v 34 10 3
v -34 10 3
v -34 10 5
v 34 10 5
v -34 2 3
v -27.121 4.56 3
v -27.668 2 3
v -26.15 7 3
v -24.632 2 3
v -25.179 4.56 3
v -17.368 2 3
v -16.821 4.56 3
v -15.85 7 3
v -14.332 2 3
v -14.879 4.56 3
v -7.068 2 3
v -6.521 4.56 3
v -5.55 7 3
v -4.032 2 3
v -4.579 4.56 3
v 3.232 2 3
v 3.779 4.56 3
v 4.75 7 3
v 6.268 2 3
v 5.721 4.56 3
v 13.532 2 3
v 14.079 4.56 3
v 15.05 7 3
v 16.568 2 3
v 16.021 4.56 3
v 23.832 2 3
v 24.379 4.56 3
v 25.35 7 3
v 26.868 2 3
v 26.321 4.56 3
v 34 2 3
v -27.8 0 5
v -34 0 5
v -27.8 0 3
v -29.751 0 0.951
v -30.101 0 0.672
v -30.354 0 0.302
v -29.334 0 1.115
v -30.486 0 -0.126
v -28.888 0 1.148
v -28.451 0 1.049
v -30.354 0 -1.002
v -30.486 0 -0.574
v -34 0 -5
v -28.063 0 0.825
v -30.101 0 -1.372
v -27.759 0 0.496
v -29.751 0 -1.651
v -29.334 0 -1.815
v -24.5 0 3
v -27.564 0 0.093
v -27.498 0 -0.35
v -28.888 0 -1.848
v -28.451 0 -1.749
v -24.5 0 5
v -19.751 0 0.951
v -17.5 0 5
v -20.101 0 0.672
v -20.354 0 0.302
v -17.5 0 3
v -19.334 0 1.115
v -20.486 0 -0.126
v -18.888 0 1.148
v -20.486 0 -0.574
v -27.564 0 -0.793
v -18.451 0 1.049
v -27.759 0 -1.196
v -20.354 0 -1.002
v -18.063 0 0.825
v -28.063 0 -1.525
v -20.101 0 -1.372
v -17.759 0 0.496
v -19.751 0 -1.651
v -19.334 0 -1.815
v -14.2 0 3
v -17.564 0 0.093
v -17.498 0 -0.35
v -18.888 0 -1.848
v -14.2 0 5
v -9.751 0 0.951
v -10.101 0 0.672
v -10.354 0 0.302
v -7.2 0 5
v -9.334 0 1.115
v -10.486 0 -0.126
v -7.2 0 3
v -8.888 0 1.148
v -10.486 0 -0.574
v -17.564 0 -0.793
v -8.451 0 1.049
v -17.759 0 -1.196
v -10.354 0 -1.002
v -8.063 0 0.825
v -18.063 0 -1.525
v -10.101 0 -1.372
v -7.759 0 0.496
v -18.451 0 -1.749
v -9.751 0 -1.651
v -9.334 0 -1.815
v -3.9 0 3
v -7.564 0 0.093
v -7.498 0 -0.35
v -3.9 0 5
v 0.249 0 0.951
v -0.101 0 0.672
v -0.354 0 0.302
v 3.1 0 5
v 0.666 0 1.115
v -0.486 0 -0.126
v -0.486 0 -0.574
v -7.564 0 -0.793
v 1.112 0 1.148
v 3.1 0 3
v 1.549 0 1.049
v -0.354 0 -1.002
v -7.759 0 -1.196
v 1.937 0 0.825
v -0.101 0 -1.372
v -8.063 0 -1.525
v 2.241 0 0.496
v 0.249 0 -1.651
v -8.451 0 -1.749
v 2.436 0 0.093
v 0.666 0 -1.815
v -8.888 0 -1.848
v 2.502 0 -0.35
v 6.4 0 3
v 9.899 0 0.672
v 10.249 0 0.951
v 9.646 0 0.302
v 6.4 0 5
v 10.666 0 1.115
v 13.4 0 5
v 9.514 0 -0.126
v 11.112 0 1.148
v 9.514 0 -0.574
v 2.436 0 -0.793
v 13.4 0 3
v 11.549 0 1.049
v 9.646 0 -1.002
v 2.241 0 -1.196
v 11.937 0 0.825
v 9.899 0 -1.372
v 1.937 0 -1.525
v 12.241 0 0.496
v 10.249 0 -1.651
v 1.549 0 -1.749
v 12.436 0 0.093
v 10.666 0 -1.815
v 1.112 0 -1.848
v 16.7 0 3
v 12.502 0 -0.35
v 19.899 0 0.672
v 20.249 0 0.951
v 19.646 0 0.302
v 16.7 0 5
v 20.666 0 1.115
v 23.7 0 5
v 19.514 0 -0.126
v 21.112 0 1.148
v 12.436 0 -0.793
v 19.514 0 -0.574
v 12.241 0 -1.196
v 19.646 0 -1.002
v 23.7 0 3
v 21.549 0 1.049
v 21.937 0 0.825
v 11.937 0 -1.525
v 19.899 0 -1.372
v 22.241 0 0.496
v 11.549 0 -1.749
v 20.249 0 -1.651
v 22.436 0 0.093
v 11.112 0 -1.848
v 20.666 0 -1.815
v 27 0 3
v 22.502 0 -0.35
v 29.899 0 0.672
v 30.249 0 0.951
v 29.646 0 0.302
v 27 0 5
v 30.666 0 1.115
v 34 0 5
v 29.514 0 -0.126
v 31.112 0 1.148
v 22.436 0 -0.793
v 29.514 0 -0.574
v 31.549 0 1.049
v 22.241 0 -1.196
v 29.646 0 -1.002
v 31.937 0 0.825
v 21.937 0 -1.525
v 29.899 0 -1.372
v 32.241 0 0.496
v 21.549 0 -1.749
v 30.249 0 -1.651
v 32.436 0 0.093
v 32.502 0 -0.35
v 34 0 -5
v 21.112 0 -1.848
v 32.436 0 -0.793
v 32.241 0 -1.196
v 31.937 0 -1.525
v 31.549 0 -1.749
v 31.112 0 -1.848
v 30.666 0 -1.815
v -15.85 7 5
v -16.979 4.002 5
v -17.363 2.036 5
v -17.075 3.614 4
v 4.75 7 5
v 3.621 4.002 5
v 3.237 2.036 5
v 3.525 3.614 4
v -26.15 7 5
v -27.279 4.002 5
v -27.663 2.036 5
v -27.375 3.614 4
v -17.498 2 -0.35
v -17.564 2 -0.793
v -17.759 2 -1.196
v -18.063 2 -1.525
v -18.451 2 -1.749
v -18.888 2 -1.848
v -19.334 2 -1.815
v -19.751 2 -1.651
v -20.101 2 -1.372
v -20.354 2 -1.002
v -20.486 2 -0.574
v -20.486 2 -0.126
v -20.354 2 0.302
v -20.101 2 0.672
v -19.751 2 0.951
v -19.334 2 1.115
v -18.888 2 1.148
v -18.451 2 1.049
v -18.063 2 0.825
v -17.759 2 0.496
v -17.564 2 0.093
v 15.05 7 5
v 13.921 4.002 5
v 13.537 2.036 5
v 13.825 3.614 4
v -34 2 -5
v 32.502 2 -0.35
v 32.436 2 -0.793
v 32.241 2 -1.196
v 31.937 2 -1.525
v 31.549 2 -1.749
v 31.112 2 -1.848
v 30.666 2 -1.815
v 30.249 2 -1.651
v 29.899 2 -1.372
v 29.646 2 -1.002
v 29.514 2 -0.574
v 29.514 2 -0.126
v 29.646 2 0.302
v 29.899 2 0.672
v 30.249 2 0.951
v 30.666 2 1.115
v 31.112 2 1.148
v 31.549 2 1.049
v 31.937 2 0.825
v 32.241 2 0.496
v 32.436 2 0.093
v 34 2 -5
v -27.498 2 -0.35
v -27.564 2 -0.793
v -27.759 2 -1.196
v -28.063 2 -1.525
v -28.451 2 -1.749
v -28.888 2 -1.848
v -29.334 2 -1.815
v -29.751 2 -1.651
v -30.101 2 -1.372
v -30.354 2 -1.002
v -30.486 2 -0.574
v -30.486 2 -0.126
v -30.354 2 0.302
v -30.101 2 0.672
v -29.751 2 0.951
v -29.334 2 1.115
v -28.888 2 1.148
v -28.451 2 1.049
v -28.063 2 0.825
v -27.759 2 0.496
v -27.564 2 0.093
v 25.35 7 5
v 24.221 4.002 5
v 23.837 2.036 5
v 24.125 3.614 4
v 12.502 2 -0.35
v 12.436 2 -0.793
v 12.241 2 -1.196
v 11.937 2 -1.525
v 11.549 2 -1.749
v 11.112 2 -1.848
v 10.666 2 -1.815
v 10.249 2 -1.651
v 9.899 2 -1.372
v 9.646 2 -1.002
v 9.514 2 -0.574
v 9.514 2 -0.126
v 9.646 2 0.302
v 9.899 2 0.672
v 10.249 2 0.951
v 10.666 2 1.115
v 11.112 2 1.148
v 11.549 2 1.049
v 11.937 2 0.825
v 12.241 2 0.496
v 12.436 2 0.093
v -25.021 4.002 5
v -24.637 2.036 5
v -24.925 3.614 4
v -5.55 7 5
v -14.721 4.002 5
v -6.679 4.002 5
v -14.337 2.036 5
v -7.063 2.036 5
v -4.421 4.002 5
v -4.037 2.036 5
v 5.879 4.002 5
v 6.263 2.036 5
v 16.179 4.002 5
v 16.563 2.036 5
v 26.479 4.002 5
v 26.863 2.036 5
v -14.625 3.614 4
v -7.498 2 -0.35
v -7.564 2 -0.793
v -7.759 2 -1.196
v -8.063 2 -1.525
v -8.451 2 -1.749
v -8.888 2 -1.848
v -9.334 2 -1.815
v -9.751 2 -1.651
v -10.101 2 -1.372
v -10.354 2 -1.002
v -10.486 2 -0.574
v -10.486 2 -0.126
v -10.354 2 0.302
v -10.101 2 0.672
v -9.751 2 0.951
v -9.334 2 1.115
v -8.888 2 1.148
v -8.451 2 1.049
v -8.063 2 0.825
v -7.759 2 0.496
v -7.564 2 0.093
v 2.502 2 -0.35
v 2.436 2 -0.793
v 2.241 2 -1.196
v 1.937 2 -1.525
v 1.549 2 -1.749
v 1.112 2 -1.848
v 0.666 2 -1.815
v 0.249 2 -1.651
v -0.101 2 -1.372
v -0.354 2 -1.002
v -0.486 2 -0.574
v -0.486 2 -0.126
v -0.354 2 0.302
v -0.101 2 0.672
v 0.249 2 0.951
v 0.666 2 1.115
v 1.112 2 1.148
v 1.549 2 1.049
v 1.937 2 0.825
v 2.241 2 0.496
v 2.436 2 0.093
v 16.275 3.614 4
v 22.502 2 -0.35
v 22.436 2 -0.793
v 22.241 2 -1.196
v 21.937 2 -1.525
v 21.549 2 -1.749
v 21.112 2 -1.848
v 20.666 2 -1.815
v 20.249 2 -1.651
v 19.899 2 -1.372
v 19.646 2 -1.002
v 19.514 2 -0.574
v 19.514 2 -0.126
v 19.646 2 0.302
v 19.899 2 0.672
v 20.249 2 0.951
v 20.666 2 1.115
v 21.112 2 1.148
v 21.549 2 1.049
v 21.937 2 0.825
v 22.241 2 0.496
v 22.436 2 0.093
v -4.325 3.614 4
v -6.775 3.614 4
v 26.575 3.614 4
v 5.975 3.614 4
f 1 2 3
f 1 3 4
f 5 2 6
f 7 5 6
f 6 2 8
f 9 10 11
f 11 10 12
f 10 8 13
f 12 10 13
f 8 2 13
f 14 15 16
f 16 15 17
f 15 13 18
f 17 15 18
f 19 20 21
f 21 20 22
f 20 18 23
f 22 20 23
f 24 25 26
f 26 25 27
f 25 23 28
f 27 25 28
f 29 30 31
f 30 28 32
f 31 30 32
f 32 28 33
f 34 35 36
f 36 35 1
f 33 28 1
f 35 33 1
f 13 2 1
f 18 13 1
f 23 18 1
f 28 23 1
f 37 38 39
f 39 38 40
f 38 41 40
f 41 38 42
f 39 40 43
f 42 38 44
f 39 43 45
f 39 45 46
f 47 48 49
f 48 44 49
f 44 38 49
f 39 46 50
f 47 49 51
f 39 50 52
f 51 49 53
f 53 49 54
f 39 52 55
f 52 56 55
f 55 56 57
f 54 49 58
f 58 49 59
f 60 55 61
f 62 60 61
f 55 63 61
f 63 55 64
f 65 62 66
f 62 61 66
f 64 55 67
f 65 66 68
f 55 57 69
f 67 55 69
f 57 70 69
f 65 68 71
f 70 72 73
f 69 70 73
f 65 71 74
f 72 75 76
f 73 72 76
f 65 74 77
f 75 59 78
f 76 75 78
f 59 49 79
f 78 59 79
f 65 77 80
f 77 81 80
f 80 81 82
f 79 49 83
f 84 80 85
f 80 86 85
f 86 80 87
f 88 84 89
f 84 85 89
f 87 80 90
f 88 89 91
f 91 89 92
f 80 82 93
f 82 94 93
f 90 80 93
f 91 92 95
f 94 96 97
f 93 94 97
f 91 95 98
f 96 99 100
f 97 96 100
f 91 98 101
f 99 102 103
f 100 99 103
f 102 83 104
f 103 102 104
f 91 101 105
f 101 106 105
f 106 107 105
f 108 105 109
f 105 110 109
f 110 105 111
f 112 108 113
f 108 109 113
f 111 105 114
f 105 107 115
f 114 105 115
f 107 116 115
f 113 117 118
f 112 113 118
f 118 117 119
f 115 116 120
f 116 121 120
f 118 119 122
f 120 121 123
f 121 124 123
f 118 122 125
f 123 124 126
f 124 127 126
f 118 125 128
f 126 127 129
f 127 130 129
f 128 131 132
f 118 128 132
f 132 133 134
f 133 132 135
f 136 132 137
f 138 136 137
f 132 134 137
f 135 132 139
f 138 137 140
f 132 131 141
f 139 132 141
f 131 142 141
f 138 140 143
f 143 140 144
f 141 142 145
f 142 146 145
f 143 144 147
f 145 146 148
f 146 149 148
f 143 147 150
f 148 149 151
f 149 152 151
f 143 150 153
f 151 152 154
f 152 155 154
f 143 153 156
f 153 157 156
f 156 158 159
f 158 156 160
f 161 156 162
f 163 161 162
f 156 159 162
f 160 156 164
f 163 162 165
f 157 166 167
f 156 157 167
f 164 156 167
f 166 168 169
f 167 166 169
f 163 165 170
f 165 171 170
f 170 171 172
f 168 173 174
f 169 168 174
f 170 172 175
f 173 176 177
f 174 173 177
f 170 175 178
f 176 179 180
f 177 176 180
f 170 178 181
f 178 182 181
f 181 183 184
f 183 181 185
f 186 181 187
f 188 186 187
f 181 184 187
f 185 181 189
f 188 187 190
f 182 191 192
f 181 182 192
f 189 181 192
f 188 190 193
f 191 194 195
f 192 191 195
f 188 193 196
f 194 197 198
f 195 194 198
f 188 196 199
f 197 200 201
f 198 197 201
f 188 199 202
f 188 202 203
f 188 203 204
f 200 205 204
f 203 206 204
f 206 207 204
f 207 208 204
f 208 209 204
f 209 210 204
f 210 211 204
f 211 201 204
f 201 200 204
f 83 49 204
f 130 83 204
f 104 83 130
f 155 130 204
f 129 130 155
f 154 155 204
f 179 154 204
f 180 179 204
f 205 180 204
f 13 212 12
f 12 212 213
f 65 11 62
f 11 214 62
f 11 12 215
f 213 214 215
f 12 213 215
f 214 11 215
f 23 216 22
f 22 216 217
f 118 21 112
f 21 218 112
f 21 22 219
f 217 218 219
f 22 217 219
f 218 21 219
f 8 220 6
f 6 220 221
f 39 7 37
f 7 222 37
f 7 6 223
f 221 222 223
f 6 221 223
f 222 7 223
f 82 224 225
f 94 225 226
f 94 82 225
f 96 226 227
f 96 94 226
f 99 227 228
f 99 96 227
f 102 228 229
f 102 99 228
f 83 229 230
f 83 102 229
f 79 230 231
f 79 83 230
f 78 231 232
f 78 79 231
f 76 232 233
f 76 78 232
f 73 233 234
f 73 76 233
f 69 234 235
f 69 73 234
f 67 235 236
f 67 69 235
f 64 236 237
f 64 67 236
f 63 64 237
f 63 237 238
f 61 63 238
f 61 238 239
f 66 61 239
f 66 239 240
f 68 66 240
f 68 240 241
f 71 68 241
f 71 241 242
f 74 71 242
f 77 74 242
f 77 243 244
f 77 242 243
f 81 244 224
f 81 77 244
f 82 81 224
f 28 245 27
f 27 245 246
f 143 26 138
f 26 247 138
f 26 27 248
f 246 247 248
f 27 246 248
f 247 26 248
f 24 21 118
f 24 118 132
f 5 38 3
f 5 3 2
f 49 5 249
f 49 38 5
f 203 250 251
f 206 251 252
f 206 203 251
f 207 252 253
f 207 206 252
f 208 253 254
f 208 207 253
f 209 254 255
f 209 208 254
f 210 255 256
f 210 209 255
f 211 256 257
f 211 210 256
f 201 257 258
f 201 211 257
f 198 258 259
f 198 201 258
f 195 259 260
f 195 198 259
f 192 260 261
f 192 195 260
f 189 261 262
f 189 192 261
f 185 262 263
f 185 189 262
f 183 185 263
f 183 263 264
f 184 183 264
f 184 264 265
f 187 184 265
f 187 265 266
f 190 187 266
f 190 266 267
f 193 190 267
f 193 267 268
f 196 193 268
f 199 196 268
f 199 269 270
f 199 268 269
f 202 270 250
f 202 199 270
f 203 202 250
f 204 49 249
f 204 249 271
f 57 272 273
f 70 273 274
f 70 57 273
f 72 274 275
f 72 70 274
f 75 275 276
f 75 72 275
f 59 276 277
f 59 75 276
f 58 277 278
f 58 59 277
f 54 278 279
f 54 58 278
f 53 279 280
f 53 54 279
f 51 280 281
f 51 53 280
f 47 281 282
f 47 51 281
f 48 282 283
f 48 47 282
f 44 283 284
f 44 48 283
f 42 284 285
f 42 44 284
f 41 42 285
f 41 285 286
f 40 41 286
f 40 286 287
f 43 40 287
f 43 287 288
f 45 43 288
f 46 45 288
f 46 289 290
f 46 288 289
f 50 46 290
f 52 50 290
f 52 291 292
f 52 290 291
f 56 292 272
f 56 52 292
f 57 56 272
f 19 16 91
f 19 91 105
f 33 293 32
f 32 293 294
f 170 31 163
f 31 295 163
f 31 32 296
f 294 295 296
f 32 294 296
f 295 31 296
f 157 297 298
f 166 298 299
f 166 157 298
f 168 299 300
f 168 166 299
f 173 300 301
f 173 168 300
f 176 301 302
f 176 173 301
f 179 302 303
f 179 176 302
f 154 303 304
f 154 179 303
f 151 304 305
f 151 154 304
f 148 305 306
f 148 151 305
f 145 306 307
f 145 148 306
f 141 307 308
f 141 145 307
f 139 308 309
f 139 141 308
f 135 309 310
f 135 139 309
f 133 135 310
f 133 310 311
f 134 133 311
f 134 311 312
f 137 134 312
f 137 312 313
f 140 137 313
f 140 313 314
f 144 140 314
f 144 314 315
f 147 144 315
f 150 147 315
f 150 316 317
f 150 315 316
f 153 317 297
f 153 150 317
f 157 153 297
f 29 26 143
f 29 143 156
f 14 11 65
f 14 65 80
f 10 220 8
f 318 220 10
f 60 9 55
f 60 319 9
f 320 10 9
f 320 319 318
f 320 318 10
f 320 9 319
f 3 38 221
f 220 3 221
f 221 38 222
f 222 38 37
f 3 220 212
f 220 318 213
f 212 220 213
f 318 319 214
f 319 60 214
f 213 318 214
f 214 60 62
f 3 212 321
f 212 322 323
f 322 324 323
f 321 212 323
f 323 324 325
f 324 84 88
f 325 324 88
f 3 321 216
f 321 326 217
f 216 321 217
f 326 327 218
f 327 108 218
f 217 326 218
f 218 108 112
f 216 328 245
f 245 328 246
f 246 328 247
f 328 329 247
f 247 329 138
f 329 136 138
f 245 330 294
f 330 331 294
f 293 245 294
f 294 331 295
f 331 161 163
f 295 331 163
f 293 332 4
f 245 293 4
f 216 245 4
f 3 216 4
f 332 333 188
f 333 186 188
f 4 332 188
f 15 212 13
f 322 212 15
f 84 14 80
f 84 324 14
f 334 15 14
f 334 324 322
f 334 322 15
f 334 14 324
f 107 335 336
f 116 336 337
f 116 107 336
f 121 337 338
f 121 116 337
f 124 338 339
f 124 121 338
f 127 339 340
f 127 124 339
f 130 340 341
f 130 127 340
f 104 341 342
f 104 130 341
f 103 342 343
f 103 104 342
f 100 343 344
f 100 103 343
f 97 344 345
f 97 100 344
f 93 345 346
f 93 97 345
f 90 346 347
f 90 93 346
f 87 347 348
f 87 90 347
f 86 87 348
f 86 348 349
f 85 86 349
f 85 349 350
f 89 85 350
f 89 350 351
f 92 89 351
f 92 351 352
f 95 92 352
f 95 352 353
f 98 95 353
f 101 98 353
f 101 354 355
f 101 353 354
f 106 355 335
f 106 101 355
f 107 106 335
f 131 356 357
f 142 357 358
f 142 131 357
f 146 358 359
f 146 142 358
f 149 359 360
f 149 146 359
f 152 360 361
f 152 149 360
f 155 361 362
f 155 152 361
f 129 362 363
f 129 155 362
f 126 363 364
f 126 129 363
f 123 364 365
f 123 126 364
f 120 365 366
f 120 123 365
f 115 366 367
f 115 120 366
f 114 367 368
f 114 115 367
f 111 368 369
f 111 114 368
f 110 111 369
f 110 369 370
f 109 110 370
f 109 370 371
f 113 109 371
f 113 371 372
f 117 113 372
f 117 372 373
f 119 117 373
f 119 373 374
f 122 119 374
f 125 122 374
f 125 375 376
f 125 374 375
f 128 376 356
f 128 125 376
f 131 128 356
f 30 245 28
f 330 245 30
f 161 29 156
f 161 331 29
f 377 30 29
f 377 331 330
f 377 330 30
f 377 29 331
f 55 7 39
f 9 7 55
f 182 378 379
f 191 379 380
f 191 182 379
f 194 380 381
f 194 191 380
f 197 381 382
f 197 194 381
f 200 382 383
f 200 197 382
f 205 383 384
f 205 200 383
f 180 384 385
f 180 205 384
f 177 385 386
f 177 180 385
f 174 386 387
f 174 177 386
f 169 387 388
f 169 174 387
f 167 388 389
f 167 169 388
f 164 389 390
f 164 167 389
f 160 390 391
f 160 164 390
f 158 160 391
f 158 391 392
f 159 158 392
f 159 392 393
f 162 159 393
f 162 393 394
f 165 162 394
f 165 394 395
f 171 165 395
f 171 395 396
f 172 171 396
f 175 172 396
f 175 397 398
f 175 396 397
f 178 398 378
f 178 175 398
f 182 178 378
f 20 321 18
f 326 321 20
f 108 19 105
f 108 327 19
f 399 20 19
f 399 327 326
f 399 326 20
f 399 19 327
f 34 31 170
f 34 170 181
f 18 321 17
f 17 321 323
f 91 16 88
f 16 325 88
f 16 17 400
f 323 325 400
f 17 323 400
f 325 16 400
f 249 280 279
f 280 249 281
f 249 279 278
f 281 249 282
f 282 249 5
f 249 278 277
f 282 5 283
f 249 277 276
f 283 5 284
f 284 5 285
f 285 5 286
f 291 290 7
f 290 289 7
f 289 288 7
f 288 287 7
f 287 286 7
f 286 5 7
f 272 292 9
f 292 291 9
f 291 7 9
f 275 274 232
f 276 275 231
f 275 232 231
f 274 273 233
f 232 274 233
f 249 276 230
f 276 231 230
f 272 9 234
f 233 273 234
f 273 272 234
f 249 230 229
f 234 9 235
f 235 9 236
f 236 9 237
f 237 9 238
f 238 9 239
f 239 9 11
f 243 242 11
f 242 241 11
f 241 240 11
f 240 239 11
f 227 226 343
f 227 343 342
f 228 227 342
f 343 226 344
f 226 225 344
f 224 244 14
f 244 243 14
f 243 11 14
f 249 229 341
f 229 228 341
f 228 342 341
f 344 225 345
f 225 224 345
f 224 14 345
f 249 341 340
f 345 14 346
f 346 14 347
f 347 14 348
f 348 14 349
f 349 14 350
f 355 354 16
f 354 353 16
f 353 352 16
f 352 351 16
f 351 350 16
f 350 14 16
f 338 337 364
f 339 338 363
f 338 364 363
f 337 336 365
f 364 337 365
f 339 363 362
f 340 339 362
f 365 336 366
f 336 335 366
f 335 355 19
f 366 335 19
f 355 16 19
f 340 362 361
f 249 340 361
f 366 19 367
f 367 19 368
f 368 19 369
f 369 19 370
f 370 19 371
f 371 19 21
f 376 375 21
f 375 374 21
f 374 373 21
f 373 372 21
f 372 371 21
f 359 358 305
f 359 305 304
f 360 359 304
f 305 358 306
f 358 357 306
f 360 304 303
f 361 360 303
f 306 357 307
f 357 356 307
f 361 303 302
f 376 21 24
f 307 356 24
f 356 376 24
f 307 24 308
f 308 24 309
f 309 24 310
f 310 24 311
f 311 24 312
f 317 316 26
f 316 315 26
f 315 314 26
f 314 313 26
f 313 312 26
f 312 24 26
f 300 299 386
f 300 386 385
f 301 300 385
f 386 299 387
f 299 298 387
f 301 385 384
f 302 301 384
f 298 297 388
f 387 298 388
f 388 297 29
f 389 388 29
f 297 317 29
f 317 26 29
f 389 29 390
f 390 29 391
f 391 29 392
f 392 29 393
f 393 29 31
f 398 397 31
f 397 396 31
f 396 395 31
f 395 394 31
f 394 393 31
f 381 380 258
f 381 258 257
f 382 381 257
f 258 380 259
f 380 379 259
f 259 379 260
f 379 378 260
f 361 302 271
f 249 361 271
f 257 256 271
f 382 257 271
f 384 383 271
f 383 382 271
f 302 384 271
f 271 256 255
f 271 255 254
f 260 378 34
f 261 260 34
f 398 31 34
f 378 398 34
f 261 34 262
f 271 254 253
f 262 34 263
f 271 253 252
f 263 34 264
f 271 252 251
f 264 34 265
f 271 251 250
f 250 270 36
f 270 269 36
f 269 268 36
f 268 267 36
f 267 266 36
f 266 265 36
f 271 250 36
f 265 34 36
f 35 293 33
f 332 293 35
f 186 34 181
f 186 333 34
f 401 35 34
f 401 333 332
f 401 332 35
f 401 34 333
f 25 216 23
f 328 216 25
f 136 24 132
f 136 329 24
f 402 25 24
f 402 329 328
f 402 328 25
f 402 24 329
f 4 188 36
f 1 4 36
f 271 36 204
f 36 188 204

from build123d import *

# Parameters (mm, degrees)
SKETCH1_W                      = 68
SKETCH1_H                      = 10
SKETCH1_R                      = 1.5025
BOSS_EXTRUDE1_DEPTH            = 10
CUT_EXTRUDE1_REACH             = 7
SKETCH2_W                      = 68
SKETCH2_H                      = 8
CUT_EXTRUDE1_DIRECTION_2_DEPTH = 3
CUT_EXTRUDE2_DEPTH             = 2


with BuildPart() as part:
    # Sketch1 → Boss-Extrude1 (new body)
    with BuildSketch(Plane(origin=(0, 0, 0), x_dir=(1, 0, 0), z_dir=(0, 1, 0))):
        Rectangle(SKETCH1_W, SKETCH1_H)
        with Locations((-29, 0.35)):
            Circle(SKETCH1_R, mode=Mode.SUBTRACT)
        with Locations((-19, 0.35)):
            Circle(SKETCH1_R, mode=Mode.SUBTRACT)
        with Locations((-9, 0.35)):
            Circle(SKETCH1_R, mode=Mode.SUBTRACT)
        with Locations((1, 0.35)):
            Circle(SKETCH1_R, mode=Mode.SUBTRACT)
        with Locations((11, 0.35)):
            Circle(SKETCH1_R, mode=Mode.SUBTRACT)
        with Locations((21, 0.35)):
            Circle(SKETCH1_R, mode=Mode.SUBTRACT)
        with Locations((31, 0.35)):
            Circle(SKETCH1_R, mode=Mode.SUBTRACT)
    extrude(amount=BOSS_EXTRUDE1_DEPTH)

    # Sketch2 → Cut-Extrude1 (cut, up to next)
    with BuildSketch(Plane.XY, mode=Mode.PRIVATE) as cut_extrude1_sk1:
        with Locations((0, 6)):
            Rectangle(SKETCH2_W, SKETCH2_H)
    cut_extrude1_tool1 = extrude(cut_extrude1_sk1.sketch, amount=-CUT_EXTRUDE1_REACH, mode=Mode.PRIVATE) & part.part
    add(cut_extrude1_tool1.solids().sort_by_distance((0, 6, 0))[0], mode=Mode.SUBTRACT)

    # Sketch2 → Cut-Extrude1 direction 2 (cut)
    with BuildSketch(Plane.XY):
        with Locations((0, 6)):
            Rectangle(SKETCH2_W, SKETCH2_H)
    extrude(amount=CUT_EXTRUDE1_DIRECTION_2_DEPTH, mode=Mode.SUBTRACT)

    # Sketch3 → Cut-Extrude2 (cut)
    with BuildSketch(Plane.XY.offset(5)):
        with BuildLine():
            Line((23.7, 0), (27, 0))
            add(Edge.make_bspline(
                [(25.35, 7), (26.975838532, 3.728518175), (27, 0)],
                knots=[0, 0, 0, 1, 1, 1], degree=2))
            add(Edge.make_bspline(
                [(25.35, 7), (23.724161468, 3.728518175), (23.7, 0)],
                knots=[0, 0, 0, 1, 1, 1], degree=2))
        make_face()
        with BuildLine():
            Line((13.4, 0), (16.7, 0))
            add(Edge.make_bspline(
                [(15.05, 7), (16.675838532, 3.728518175), (16.7, 0)],
                knots=[0, 0, 0, 1, 1, 1], degree=2))
            add(Edge.make_bspline(
                [(15.05, 7), (13.424161468, 3.728518175), (13.4, 0)],
                knots=[0, 0, 0, 1, 1, 1], degree=2))
        make_face()
        with BuildLine():
            Line((3.1, 0), (6.4, 0))
            add(Edge.make_bspline(
                [(4.75, 7), (6.375838532, 3.728518175), (6.4, 0)],
                knots=[0, 0, 0, 1, 1, 1], degree=2))
            add(Edge.make_bspline(
                [(4.75, 7), (3.124161468, 3.728518175), (3.1, 0)],
                knots=[0, 0, 0, 1, 1, 1], degree=2))
        make_face()
        with BuildLine():
            Line((-7.2, 0), (-3.9, 0))
            add(Edge.make_bspline(
                [(-5.55, 7), (-3.924161468, 3.728518175), (-3.9, 0)],
                knots=[0, 0, 0, 1, 1, 1], degree=2))
            add(Edge.make_bspline(
                [(-5.55, 7), (-7.175838532, 3.728518175), (-7.2, 0)],
                knots=[0, 0, 0, 1, 1, 1], degree=2))
        make_face()
        with BuildLine():
            Line((-17.5, 0), (-14.2, 0))
            add(Edge.make_bspline(
                [(-15.85, 7), (-14.224161468, 3.728518175), (-14.2, 0)],
                knots=[0, 0, 0, 1, 1, 1], degree=2))
            add(Edge.make_bspline(
                [(-15.85, 7), (-17.475838532, 3.728518175), (-17.5, 0)],
                knots=[0, 0, 0, 1, 1, 1], degree=2))
        make_face()
        with BuildLine():
            Line((-27.8, 0), (-24.5, 0))
            add(Edge.make_bspline(
                [(-26.15, 7), (-24.524161468, 3.728518175), (-24.5, 0)],
                knots=[0, 0, 0, 1, 1, 1], degree=2))
            add(Edge.make_bspline(
                [(-26.15, 7), (-27.775838532, 3.728518175), (-27.8, 0)],
                knots=[0, 0, 0, 1, 1, 1], degree=2))
        make_face()
    extrude(amount=-CUT_EXTRUDE2_DEPTH, mode=Mode.SUBTRACT)


solid = part.part
